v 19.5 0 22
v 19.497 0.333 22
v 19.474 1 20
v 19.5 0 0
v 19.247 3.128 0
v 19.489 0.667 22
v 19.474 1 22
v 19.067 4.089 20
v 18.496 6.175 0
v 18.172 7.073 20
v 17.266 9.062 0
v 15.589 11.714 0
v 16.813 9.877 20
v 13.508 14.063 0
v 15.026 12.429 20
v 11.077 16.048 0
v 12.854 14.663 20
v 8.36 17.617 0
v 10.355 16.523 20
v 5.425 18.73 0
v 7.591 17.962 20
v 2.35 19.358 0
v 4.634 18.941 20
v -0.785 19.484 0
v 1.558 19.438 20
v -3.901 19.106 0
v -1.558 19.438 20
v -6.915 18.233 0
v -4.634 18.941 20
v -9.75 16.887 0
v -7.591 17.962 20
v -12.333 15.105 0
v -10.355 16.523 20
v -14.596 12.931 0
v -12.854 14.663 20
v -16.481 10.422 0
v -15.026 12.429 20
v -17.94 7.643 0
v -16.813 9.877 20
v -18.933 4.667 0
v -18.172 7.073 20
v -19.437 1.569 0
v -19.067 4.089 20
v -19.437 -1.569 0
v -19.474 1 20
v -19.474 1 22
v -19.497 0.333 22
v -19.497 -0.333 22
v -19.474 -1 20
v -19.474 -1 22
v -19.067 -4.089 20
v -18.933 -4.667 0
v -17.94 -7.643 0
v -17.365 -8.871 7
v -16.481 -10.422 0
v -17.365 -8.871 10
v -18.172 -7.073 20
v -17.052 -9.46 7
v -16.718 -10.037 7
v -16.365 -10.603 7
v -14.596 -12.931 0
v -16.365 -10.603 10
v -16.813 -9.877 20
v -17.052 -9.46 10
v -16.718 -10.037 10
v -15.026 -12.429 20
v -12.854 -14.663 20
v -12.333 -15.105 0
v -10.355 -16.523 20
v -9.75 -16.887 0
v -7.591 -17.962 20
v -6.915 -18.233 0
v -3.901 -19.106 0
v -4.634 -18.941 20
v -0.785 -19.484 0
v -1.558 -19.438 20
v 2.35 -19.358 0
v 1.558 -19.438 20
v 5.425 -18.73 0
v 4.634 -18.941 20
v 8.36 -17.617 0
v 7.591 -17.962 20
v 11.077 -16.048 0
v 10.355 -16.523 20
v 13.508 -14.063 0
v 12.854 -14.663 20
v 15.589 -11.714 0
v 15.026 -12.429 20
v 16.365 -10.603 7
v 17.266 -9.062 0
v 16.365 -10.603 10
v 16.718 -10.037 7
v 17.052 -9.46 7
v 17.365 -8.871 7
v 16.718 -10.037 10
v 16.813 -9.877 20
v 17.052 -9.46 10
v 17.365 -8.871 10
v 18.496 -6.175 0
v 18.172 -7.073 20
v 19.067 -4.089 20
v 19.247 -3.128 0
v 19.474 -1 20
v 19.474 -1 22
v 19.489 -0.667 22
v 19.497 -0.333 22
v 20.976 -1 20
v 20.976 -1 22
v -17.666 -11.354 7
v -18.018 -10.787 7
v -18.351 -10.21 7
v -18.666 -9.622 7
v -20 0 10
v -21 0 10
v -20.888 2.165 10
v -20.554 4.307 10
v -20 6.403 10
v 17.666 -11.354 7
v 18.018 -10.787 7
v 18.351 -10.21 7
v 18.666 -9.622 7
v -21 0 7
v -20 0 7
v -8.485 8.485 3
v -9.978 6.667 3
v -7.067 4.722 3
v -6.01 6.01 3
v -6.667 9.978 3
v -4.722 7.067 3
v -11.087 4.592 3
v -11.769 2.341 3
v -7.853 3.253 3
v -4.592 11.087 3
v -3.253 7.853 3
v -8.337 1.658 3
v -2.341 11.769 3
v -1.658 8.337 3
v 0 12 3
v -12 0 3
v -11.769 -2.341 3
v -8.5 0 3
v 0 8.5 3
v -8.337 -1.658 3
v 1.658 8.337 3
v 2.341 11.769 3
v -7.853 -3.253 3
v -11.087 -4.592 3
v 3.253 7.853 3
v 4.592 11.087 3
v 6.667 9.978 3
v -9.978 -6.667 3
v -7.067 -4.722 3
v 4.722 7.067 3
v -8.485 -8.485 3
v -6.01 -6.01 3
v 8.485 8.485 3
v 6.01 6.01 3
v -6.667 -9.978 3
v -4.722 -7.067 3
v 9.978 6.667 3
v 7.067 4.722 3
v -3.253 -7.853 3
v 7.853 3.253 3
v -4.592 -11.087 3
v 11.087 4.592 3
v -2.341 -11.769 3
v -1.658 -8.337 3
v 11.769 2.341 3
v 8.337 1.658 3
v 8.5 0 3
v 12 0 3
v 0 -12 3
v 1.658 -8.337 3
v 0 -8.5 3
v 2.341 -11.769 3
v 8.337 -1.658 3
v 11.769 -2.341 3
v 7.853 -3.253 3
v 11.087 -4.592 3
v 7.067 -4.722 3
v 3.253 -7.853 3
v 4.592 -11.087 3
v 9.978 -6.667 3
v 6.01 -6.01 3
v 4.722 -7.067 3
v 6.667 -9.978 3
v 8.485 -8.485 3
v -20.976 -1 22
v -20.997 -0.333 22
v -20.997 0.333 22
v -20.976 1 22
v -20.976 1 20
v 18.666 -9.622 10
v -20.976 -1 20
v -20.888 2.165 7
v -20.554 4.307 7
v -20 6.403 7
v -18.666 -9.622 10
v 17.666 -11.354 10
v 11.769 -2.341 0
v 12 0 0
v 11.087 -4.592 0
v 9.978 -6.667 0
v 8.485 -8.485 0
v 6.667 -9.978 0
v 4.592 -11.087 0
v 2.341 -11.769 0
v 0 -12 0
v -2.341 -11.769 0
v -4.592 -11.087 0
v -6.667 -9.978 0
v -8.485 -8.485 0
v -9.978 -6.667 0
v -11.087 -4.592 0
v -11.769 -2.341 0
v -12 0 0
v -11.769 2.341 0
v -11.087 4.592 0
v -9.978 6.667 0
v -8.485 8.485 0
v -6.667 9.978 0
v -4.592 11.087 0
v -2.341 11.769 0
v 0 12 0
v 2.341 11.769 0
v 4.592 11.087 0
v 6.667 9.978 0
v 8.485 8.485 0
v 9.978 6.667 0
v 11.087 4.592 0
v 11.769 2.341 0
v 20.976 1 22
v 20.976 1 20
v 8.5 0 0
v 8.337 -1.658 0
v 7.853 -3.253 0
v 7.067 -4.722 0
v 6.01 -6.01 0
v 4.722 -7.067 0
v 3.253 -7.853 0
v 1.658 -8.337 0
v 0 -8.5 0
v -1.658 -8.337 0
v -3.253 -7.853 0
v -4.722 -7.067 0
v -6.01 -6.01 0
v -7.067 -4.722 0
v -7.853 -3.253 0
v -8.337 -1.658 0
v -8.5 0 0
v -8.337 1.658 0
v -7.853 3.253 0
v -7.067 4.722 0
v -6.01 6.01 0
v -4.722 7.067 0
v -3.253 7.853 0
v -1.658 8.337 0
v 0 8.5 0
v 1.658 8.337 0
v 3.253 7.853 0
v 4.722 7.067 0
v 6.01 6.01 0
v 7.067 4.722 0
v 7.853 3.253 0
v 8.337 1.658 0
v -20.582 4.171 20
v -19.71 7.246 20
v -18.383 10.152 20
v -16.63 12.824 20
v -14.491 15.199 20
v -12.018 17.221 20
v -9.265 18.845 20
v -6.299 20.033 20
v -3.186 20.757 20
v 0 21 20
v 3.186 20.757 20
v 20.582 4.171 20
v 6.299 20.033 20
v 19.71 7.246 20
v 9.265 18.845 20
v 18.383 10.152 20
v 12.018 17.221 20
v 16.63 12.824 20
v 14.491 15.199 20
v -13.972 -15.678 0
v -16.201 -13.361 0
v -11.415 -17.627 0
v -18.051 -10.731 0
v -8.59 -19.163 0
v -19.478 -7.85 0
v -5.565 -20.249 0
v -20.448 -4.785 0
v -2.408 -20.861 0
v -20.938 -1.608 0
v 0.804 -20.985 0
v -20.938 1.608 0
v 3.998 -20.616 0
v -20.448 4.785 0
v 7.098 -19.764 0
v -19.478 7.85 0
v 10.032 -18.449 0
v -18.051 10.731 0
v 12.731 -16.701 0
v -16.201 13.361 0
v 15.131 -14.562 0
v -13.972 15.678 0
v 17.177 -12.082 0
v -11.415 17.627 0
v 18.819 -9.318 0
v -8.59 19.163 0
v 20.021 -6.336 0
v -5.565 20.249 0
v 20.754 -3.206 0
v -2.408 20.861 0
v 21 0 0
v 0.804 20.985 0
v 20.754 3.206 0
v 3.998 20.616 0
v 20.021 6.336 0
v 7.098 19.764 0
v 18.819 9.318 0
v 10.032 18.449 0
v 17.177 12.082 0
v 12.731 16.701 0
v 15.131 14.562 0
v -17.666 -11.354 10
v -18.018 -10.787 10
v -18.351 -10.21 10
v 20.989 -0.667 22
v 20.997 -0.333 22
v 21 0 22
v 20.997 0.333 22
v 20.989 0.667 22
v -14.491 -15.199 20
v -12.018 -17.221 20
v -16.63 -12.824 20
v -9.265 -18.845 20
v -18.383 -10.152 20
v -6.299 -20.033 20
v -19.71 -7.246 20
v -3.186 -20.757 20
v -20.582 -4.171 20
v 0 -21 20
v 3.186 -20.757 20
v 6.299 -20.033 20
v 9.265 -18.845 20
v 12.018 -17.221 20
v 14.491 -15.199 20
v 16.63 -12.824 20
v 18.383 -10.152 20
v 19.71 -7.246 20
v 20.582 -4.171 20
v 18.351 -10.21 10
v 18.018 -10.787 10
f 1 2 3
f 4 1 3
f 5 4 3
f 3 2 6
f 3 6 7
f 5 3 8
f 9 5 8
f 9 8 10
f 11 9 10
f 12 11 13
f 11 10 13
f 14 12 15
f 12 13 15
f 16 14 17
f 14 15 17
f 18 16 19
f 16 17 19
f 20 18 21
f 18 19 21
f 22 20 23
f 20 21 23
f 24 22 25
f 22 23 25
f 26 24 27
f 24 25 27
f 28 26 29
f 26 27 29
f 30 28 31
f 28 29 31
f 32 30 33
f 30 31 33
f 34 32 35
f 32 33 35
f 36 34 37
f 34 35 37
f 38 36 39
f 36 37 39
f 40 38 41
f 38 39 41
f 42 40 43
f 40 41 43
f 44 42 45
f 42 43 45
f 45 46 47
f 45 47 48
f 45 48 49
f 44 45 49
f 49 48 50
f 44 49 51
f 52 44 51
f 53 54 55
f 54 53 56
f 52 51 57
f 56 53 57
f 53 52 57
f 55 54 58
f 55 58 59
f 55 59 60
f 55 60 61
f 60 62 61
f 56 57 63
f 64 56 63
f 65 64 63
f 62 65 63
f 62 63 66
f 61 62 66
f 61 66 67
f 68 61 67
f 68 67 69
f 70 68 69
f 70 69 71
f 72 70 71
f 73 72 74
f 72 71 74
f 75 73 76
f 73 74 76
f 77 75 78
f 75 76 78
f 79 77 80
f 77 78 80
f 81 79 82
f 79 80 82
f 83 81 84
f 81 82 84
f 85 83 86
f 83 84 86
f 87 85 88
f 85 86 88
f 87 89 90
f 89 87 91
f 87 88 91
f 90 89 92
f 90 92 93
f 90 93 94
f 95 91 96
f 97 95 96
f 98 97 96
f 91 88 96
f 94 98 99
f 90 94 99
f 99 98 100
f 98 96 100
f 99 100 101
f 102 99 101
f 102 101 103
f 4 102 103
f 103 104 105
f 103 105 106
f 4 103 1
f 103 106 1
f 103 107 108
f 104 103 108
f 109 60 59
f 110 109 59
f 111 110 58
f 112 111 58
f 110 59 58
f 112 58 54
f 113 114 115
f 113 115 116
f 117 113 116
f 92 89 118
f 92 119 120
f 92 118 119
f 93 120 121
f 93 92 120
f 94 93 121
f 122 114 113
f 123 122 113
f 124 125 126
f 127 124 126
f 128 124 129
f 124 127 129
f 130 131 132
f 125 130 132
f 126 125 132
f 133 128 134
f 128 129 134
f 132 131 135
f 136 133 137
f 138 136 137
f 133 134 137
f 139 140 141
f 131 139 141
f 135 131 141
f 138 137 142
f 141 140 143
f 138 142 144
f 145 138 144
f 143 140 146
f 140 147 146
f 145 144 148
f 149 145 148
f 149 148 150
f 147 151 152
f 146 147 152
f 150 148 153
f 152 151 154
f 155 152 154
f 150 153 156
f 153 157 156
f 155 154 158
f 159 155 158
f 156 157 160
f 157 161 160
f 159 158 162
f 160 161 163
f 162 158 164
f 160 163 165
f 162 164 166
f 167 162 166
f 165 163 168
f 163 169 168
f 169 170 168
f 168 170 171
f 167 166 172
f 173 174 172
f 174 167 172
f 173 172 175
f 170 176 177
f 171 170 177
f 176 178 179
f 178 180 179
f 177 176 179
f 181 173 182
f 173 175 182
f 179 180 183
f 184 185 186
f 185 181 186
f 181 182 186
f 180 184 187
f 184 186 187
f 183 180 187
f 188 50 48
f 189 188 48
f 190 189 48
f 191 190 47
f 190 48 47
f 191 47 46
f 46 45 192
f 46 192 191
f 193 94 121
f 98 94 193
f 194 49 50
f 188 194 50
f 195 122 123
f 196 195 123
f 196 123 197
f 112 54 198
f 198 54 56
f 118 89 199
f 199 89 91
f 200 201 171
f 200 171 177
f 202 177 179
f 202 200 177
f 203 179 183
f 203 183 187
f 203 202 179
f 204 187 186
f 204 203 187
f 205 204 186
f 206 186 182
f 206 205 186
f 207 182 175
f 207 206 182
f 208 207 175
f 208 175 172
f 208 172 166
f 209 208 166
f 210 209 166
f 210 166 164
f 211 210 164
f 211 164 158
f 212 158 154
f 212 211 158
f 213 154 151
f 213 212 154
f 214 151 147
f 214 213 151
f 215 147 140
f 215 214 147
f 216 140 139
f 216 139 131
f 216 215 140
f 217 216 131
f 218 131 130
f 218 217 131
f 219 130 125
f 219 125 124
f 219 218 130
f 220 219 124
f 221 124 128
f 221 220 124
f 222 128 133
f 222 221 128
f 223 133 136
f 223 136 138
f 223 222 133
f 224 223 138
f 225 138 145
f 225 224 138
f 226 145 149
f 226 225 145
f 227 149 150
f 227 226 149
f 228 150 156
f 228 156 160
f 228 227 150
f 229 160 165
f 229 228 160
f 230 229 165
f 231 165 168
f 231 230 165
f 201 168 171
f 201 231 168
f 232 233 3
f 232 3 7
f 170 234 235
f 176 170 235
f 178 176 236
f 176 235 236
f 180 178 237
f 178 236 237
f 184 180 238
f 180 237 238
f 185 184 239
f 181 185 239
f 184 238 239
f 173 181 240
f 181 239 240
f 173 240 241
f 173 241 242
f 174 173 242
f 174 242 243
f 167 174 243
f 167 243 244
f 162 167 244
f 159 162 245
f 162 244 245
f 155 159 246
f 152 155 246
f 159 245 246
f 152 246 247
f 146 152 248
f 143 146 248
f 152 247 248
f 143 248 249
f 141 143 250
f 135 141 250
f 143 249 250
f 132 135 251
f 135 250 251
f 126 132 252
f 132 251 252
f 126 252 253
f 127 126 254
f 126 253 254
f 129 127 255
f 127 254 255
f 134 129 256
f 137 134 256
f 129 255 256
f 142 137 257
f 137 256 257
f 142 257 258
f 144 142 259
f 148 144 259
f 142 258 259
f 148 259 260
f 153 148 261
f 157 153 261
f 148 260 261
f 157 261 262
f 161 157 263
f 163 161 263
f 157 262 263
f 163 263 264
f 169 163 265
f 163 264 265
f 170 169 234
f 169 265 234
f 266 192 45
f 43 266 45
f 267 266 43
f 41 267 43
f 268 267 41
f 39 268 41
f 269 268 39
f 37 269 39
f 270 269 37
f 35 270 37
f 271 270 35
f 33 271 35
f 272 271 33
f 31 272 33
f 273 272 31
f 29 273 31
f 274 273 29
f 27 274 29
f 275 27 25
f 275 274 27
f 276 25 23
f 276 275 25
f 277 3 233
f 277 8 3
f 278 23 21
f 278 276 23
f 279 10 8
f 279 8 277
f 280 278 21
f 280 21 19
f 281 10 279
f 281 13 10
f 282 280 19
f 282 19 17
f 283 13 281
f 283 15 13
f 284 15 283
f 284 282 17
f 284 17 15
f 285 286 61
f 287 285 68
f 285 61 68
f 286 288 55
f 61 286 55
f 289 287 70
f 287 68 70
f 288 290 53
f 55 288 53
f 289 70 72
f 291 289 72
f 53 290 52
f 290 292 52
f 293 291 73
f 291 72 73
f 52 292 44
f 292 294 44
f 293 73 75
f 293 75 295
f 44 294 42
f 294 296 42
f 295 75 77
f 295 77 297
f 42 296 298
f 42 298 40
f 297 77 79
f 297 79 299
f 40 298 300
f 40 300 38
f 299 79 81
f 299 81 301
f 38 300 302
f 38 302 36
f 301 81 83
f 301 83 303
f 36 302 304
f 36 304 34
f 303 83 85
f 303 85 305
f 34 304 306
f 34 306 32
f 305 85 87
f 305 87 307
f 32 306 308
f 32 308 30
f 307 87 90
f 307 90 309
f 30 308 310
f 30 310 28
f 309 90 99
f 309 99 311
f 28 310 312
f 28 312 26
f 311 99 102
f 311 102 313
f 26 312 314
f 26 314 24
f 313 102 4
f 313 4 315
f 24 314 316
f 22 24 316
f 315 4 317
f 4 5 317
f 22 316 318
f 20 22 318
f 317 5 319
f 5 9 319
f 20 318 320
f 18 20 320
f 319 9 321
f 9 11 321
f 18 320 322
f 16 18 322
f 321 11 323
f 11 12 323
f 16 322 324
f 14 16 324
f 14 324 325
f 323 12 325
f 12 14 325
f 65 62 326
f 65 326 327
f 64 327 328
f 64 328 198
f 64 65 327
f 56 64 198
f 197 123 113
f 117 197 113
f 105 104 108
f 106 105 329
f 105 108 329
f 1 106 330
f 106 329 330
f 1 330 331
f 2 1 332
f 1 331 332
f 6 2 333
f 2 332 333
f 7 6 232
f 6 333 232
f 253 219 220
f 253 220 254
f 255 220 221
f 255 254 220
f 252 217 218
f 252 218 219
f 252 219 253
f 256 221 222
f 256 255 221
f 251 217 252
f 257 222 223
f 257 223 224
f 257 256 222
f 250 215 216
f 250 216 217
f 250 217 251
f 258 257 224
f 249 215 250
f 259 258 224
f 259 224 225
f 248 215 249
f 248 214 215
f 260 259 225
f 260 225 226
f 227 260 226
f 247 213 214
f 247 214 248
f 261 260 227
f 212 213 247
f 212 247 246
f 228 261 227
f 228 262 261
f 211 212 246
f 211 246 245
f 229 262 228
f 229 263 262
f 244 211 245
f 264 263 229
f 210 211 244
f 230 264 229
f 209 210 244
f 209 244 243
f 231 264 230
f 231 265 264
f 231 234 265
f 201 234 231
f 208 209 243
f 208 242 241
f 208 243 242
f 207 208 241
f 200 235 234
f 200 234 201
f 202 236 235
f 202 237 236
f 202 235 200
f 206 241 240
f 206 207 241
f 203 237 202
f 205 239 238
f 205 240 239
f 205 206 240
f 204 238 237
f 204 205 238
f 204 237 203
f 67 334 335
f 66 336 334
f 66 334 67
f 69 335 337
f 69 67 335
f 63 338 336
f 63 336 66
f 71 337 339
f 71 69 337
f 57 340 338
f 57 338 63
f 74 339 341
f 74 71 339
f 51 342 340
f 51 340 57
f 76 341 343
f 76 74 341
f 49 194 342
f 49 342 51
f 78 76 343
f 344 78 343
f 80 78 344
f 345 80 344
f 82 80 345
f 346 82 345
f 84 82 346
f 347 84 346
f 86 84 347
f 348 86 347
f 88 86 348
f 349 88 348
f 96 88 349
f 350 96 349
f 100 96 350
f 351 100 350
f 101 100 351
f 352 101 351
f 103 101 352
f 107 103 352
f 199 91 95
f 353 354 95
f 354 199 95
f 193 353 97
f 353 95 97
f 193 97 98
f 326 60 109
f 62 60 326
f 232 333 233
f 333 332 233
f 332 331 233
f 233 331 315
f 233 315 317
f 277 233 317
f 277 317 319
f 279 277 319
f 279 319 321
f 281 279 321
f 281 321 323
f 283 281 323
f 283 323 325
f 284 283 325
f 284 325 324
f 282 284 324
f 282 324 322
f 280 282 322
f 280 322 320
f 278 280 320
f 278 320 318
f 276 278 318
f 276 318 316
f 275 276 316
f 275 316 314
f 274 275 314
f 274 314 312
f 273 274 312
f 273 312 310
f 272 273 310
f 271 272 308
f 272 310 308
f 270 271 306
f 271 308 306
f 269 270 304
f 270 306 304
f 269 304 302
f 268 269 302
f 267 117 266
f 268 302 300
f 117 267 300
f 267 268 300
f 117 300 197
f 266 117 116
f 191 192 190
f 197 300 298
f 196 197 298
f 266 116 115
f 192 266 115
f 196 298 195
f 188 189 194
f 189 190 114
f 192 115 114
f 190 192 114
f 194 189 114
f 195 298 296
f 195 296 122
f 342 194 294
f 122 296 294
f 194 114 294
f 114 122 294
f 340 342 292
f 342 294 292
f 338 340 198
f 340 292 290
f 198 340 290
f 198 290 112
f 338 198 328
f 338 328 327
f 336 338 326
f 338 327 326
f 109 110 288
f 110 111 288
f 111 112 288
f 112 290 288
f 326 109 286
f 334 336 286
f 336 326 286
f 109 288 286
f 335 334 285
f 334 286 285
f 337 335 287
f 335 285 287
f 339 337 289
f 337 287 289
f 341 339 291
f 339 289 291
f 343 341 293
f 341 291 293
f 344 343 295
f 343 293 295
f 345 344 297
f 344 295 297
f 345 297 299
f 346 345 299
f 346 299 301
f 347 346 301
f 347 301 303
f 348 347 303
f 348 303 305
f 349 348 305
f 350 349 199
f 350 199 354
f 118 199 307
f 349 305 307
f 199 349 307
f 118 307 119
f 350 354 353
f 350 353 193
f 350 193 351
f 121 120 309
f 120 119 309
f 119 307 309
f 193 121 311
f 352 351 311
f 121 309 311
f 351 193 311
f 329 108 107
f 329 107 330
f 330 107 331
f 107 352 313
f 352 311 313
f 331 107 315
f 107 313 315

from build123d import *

# Parameters (mm, degrees)
F0_R      = 21
F0_R_2    = 19.5
F1_DEPTH  = 20
F2_W      = 2
F2_H      = 2
F3_DEPTH  = 25
F4_R      = 19.5
F5_DEPTH  = 25
F6_R      = 25.0510774743
F6_R_2    = 21
F7_DEPTH  = 2.001
F8_R      = 12
F8_R_2    = 8.5
F9_DEPTH  = 3
F16_W     = 2
F16_H     = 3
F17_DEPTH = 21.001
F18_W     = 2
F18_H     = 3
F19_DEPTH = 28.6875334795
F20_W     = 2
F20_H     = 3
F21_DEPTH = 28.6875334795


# Not quite as in the source:
# - a feature of the source that left no trace in its solid (it failed there, or was rolled back) is left out


with BuildPart() as f1:
    # F0 (on Top) → F1 (new body)
    with BuildSketch(Plane.XY):
        Circle(F0_R)
        Circle(F0_R_2, mode=Mode.SUBTRACT)
    extrude(amount=F1_DEPTH)

    # F2 (on Right) → F3 (join, symmetric)
    with BuildSketch(Plane.YZ):
        with Locations((0, 21)):
            Rectangle(F2_W, F2_H)
    extrude(amount=F3_DEPTH, both=True)

    # F4 (on face) → F5 (cut)
    with BuildSketch(Plane.XY.offset(22)):
        Circle(F4_R)
    extrude(amount=-F5_DEPTH, mode=Mode.SUBTRACT)

    # F6 (on face) → F7 (cut, through all)
    with BuildSketch(Plane.XY.offset(20)):
        Circle(F6_R)
        Circle(F6_R_2, mode=Mode.SUBTRACT)
    extrude(amount=F7_DEPTH, mode=Mode.SUBTRACT)

    # F16 (on Front) → F17 (cut, through all)
    with BuildSketch(Plane.XZ):
        with Locations((-21, 8.5)):
            Rectangle(F16_W, F16_H)
    extrude(amount=-F17_DEPTH, mode=Mode.SUBTRACT)

    # F18 (on face) → F19 (cut, through all)
    with BuildSketch(Plane(origin=(0, 0, 0), x_dir=(0.5, 0.8660254038, 0), z_dir=(0.8660254038, -0.5, 0))):
        with Locations((0, 8.5)):
            Rectangle(F18_W, F18_H)
    extrude(amount=F19_DEPTH, mode=Mode.SUBTRACT)

    # F20 (on face) → F21 (cut, through all)
    with BuildSketch(Plane(origin=(0, 0, 0), x_dir=(-0.5, 0.8660254038, 0), z_dir=(0.8660254038, 0.5, 0))):
        with Locations((0, 8.5)):
            Rectangle(F20_W, F20_H)
    extrude(amount=-F21_DEPTH, mode=Mode.SUBTRACT)


with BuildPart() as f9:
    # F8 (on face) → F9 (new body)
    with BuildSketch(Plane(origin=(0, 0, 0), x_dir=(1, 0, 0), z_dir=(0, 0, -1))):
        Circle(F8_R)
        Circle(F8_R_2, mode=Mode.SUBTRACT)
    extrude(amount=-F9_DEPTH)


solid = Compound([f1.part, f9.part])
